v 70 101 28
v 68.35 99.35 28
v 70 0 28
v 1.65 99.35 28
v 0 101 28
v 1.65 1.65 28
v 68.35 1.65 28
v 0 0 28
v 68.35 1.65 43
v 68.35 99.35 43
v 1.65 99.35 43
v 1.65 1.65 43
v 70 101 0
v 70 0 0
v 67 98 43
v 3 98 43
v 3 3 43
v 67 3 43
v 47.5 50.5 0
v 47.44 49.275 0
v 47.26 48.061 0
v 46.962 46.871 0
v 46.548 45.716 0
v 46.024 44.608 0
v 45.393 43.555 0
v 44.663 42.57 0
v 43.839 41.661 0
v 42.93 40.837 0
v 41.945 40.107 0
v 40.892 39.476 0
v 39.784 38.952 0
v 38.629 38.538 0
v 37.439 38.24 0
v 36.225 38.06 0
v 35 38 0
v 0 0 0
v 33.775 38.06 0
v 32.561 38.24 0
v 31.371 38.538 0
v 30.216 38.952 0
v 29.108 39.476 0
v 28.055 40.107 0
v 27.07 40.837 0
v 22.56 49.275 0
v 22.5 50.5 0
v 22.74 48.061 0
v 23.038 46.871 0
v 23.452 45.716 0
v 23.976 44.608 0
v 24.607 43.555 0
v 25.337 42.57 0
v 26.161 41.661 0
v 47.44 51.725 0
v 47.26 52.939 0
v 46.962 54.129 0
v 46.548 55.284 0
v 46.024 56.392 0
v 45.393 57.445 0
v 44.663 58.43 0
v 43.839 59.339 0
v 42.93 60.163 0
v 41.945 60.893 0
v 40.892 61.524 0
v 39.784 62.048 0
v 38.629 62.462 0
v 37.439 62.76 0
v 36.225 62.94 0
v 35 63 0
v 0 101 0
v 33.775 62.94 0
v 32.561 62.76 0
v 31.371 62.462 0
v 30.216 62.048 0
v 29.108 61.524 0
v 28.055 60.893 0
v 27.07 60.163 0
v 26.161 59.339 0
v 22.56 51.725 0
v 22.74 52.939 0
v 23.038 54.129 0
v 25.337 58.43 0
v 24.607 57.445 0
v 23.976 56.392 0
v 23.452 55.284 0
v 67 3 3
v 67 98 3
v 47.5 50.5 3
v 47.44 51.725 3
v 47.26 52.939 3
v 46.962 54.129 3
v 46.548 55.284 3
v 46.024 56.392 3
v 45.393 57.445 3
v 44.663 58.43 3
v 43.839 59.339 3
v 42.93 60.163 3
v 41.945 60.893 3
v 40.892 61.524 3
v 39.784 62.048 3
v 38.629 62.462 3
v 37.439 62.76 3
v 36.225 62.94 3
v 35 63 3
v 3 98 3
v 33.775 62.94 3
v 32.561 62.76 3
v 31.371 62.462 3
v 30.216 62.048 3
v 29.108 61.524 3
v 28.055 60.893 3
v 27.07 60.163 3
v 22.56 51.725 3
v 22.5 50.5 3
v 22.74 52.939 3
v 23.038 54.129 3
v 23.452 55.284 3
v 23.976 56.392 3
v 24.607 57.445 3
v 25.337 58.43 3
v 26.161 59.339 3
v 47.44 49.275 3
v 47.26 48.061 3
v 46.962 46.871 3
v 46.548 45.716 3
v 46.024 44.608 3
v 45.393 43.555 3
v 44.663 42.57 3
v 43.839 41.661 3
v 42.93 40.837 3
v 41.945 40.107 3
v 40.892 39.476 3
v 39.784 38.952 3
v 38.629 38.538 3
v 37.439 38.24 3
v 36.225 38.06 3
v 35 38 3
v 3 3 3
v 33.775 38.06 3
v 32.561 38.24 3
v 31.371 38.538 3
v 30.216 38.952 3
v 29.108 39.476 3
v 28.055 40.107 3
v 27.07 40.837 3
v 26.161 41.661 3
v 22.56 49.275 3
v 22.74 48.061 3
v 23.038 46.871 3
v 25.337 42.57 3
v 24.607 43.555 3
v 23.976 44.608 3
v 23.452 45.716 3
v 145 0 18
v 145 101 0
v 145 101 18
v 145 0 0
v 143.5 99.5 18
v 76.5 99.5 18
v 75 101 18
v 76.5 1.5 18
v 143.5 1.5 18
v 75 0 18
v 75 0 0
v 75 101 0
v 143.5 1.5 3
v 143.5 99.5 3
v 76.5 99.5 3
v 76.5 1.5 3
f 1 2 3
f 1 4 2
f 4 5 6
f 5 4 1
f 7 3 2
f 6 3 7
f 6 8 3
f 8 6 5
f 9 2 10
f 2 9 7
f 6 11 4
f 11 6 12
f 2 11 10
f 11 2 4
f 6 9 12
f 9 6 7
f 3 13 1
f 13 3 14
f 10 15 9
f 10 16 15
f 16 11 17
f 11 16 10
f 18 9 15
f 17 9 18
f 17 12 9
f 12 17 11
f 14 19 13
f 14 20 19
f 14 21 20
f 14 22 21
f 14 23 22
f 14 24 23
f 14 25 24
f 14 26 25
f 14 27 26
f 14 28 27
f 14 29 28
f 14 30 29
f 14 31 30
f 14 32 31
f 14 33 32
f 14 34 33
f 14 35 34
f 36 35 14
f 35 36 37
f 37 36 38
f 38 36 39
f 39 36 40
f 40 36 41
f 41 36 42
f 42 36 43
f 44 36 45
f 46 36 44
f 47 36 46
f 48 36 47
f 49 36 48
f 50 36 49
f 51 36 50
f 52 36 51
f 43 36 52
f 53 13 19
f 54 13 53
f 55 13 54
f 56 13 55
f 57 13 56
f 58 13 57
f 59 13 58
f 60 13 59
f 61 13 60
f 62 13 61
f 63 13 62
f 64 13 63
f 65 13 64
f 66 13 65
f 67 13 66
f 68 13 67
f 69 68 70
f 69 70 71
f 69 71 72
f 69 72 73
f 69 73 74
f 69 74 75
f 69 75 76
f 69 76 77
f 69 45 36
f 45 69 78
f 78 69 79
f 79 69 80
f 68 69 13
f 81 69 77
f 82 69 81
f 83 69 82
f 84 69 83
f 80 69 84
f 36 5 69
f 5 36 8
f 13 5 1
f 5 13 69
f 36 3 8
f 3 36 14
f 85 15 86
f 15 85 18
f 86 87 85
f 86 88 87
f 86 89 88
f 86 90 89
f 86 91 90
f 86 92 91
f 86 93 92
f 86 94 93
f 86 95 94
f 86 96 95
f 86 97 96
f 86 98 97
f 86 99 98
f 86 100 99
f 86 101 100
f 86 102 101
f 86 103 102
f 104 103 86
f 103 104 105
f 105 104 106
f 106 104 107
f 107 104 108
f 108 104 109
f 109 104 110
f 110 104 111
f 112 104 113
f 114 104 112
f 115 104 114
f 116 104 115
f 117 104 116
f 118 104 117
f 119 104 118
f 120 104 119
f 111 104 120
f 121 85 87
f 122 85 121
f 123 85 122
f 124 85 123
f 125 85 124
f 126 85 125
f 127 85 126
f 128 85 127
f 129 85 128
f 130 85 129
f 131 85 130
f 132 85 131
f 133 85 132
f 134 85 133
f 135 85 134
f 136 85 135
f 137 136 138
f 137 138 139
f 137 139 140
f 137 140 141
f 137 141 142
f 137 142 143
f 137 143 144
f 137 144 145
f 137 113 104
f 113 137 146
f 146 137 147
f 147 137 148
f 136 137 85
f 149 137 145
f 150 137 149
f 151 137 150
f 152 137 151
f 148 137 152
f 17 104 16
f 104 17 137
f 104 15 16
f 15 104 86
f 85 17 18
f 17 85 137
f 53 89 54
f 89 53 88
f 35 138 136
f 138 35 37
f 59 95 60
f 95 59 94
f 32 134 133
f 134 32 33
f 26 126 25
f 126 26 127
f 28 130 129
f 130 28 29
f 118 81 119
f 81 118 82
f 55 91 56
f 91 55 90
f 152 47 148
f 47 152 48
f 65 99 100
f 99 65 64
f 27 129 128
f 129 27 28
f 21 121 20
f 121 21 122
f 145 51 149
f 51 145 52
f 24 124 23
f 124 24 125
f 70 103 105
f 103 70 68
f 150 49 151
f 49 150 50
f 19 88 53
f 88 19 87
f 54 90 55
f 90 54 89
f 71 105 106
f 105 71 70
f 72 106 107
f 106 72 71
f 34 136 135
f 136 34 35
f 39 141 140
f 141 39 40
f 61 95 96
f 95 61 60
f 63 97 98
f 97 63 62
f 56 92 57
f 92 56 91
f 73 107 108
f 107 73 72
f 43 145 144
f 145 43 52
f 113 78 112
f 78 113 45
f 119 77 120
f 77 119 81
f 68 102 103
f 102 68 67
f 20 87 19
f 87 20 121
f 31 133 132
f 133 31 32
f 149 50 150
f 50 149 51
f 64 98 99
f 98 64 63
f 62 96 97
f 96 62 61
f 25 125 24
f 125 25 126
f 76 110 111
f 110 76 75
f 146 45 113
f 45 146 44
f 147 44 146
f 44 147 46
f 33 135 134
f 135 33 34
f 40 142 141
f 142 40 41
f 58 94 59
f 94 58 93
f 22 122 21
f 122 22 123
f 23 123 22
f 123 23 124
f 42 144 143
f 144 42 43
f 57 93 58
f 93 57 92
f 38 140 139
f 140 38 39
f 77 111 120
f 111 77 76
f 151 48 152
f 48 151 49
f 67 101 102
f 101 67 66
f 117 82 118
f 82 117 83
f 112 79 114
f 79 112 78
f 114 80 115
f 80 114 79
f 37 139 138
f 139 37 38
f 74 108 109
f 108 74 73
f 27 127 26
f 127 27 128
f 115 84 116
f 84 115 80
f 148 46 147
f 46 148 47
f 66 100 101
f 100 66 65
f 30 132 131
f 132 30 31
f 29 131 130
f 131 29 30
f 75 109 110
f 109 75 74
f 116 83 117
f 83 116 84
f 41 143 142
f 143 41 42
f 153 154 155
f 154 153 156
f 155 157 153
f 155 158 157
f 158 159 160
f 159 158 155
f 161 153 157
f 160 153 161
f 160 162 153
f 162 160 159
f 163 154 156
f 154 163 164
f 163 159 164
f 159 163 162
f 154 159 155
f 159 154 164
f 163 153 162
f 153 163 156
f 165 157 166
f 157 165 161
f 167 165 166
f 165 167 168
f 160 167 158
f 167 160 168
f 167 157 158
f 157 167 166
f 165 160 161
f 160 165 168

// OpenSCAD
// ---------------------------------------------------------------
// Box with friction-fit slide-on lid (square corners)
//
// The top `lip_height` of the box wall is stepped inward so the
// lid's skirt slides over it and sits flush with the outer wall.
// Friction between skirt and lip holds the lid in place.
// ---------------------------------------------------------------

/* [Inside dimensions] */
inside_x = 64;   // interior length
inside_y = 95;   // interior width
inside_z = 40;   // interior height (floor to underside of lid top)

/* [Walls] */
wall   = 3;      // box wall thickness (also floor thickness)
lid_top = 3;     // lid top plate thickness

/* [Lid fit] */
lip_height = 15;   // depth of the lid skirt / height of the inset lip
skirt     = 1.5;   // lid skirt wall thickness
clearance = 0.15;  // gap between skirt and lip per side; tune for friction

/* [Bottom cutout] */
finger_hole_d = 25;  // diameter of the push-out hole in the floor; 0 = no hole

/* [View] */
// "print"     -> both parts flat on the bed, side by side
// "assembled" -> lid on the box
// "open"      -> lid hovering above the box
view = "print"; // [print, assembled, open]

// ---------------------------------------------------------------
// Derived dimensions
// ---------------------------------------------------------------
outer_x = inside_x + 2 * wall;
outer_y = inside_y + 2 * wall;
box_h   = wall + inside_z;           // outer box height (floor + interior)

lip_wall = wall - skirt - clearance; // remaining wall thickness at the lip
lip_x = inside_x + 2 * lip_wall;     // lip outer footprint
lip_y = inside_y + 2 * lip_wall;

assert(lip_wall >= 0.8, "wall too thin: increase wall or reduce skirt/clearance");
assert(inside_z > lip_height, "inside_z must exceed lip_height");

// ---------------------------------------------------------------
// Parts
// ---------------------------------------------------------------
module box() {
    difference() {
        // full outer shell
        cube([outer_x, outer_y, box_h]);
        // interior cavity
        translate([wall, wall, wall])
            cube([inside_x, inside_y, inside_z + 1]);
        // push-out hole in the floor
        if (finger_hole_d > 0)
            translate([outer_x / 2, outer_y / 2, -1])
                cylinder(d = finger_hole_d, h = wall + 2, $fn = 64);
        // step the top of the wall inward to form the lip
        difference() {
            translate([-1, -1, box_h - lip_height])
                cube([outer_x + 2, outer_y + 2, lip_height + 1]);
            translate([(outer_x - lip_x) / 2, (outer_y - lip_y) / 2, box_h - lip_height - 1])
                cube([lip_x, lip_y, lip_height + 2]);
        }
    }
}

module lid() {
    // modeled upside down (top plate on the bed) - print orientation
    difference() {
        cube([outer_x, outer_y, lid_top + lip_height]);
        // cavity that receives the lip (15mm deep -> friction)
        translate([(outer_x - lip_x) / 2 - clearance,
                   (outer_y - lip_y) / 2 - clearance,
                   lid_top])
            cube([lip_x + 2 * clearance, lip_y + 2 * clearance, lip_height + 1]);
    }
}

// lid flipped right-side up and placed on the box
module lid_on_box(lift = 0) {
    translate([0, 0, box_h + lid_top + lift])
        rotate([180, 0, 0])
            translate([0, -outer_y, 0])
                lid();
}

// ---------------------------------------------------------------
// Layout
// ---------------------------------------------------------------
if (view == "print") {
    box();
    translate([outer_x + 5, 0, 0]) lid();
} else if (view == "assembled") {
    box();
    lid_on_box();
} else { // open
    box();
    lid_on_box(30);
}
